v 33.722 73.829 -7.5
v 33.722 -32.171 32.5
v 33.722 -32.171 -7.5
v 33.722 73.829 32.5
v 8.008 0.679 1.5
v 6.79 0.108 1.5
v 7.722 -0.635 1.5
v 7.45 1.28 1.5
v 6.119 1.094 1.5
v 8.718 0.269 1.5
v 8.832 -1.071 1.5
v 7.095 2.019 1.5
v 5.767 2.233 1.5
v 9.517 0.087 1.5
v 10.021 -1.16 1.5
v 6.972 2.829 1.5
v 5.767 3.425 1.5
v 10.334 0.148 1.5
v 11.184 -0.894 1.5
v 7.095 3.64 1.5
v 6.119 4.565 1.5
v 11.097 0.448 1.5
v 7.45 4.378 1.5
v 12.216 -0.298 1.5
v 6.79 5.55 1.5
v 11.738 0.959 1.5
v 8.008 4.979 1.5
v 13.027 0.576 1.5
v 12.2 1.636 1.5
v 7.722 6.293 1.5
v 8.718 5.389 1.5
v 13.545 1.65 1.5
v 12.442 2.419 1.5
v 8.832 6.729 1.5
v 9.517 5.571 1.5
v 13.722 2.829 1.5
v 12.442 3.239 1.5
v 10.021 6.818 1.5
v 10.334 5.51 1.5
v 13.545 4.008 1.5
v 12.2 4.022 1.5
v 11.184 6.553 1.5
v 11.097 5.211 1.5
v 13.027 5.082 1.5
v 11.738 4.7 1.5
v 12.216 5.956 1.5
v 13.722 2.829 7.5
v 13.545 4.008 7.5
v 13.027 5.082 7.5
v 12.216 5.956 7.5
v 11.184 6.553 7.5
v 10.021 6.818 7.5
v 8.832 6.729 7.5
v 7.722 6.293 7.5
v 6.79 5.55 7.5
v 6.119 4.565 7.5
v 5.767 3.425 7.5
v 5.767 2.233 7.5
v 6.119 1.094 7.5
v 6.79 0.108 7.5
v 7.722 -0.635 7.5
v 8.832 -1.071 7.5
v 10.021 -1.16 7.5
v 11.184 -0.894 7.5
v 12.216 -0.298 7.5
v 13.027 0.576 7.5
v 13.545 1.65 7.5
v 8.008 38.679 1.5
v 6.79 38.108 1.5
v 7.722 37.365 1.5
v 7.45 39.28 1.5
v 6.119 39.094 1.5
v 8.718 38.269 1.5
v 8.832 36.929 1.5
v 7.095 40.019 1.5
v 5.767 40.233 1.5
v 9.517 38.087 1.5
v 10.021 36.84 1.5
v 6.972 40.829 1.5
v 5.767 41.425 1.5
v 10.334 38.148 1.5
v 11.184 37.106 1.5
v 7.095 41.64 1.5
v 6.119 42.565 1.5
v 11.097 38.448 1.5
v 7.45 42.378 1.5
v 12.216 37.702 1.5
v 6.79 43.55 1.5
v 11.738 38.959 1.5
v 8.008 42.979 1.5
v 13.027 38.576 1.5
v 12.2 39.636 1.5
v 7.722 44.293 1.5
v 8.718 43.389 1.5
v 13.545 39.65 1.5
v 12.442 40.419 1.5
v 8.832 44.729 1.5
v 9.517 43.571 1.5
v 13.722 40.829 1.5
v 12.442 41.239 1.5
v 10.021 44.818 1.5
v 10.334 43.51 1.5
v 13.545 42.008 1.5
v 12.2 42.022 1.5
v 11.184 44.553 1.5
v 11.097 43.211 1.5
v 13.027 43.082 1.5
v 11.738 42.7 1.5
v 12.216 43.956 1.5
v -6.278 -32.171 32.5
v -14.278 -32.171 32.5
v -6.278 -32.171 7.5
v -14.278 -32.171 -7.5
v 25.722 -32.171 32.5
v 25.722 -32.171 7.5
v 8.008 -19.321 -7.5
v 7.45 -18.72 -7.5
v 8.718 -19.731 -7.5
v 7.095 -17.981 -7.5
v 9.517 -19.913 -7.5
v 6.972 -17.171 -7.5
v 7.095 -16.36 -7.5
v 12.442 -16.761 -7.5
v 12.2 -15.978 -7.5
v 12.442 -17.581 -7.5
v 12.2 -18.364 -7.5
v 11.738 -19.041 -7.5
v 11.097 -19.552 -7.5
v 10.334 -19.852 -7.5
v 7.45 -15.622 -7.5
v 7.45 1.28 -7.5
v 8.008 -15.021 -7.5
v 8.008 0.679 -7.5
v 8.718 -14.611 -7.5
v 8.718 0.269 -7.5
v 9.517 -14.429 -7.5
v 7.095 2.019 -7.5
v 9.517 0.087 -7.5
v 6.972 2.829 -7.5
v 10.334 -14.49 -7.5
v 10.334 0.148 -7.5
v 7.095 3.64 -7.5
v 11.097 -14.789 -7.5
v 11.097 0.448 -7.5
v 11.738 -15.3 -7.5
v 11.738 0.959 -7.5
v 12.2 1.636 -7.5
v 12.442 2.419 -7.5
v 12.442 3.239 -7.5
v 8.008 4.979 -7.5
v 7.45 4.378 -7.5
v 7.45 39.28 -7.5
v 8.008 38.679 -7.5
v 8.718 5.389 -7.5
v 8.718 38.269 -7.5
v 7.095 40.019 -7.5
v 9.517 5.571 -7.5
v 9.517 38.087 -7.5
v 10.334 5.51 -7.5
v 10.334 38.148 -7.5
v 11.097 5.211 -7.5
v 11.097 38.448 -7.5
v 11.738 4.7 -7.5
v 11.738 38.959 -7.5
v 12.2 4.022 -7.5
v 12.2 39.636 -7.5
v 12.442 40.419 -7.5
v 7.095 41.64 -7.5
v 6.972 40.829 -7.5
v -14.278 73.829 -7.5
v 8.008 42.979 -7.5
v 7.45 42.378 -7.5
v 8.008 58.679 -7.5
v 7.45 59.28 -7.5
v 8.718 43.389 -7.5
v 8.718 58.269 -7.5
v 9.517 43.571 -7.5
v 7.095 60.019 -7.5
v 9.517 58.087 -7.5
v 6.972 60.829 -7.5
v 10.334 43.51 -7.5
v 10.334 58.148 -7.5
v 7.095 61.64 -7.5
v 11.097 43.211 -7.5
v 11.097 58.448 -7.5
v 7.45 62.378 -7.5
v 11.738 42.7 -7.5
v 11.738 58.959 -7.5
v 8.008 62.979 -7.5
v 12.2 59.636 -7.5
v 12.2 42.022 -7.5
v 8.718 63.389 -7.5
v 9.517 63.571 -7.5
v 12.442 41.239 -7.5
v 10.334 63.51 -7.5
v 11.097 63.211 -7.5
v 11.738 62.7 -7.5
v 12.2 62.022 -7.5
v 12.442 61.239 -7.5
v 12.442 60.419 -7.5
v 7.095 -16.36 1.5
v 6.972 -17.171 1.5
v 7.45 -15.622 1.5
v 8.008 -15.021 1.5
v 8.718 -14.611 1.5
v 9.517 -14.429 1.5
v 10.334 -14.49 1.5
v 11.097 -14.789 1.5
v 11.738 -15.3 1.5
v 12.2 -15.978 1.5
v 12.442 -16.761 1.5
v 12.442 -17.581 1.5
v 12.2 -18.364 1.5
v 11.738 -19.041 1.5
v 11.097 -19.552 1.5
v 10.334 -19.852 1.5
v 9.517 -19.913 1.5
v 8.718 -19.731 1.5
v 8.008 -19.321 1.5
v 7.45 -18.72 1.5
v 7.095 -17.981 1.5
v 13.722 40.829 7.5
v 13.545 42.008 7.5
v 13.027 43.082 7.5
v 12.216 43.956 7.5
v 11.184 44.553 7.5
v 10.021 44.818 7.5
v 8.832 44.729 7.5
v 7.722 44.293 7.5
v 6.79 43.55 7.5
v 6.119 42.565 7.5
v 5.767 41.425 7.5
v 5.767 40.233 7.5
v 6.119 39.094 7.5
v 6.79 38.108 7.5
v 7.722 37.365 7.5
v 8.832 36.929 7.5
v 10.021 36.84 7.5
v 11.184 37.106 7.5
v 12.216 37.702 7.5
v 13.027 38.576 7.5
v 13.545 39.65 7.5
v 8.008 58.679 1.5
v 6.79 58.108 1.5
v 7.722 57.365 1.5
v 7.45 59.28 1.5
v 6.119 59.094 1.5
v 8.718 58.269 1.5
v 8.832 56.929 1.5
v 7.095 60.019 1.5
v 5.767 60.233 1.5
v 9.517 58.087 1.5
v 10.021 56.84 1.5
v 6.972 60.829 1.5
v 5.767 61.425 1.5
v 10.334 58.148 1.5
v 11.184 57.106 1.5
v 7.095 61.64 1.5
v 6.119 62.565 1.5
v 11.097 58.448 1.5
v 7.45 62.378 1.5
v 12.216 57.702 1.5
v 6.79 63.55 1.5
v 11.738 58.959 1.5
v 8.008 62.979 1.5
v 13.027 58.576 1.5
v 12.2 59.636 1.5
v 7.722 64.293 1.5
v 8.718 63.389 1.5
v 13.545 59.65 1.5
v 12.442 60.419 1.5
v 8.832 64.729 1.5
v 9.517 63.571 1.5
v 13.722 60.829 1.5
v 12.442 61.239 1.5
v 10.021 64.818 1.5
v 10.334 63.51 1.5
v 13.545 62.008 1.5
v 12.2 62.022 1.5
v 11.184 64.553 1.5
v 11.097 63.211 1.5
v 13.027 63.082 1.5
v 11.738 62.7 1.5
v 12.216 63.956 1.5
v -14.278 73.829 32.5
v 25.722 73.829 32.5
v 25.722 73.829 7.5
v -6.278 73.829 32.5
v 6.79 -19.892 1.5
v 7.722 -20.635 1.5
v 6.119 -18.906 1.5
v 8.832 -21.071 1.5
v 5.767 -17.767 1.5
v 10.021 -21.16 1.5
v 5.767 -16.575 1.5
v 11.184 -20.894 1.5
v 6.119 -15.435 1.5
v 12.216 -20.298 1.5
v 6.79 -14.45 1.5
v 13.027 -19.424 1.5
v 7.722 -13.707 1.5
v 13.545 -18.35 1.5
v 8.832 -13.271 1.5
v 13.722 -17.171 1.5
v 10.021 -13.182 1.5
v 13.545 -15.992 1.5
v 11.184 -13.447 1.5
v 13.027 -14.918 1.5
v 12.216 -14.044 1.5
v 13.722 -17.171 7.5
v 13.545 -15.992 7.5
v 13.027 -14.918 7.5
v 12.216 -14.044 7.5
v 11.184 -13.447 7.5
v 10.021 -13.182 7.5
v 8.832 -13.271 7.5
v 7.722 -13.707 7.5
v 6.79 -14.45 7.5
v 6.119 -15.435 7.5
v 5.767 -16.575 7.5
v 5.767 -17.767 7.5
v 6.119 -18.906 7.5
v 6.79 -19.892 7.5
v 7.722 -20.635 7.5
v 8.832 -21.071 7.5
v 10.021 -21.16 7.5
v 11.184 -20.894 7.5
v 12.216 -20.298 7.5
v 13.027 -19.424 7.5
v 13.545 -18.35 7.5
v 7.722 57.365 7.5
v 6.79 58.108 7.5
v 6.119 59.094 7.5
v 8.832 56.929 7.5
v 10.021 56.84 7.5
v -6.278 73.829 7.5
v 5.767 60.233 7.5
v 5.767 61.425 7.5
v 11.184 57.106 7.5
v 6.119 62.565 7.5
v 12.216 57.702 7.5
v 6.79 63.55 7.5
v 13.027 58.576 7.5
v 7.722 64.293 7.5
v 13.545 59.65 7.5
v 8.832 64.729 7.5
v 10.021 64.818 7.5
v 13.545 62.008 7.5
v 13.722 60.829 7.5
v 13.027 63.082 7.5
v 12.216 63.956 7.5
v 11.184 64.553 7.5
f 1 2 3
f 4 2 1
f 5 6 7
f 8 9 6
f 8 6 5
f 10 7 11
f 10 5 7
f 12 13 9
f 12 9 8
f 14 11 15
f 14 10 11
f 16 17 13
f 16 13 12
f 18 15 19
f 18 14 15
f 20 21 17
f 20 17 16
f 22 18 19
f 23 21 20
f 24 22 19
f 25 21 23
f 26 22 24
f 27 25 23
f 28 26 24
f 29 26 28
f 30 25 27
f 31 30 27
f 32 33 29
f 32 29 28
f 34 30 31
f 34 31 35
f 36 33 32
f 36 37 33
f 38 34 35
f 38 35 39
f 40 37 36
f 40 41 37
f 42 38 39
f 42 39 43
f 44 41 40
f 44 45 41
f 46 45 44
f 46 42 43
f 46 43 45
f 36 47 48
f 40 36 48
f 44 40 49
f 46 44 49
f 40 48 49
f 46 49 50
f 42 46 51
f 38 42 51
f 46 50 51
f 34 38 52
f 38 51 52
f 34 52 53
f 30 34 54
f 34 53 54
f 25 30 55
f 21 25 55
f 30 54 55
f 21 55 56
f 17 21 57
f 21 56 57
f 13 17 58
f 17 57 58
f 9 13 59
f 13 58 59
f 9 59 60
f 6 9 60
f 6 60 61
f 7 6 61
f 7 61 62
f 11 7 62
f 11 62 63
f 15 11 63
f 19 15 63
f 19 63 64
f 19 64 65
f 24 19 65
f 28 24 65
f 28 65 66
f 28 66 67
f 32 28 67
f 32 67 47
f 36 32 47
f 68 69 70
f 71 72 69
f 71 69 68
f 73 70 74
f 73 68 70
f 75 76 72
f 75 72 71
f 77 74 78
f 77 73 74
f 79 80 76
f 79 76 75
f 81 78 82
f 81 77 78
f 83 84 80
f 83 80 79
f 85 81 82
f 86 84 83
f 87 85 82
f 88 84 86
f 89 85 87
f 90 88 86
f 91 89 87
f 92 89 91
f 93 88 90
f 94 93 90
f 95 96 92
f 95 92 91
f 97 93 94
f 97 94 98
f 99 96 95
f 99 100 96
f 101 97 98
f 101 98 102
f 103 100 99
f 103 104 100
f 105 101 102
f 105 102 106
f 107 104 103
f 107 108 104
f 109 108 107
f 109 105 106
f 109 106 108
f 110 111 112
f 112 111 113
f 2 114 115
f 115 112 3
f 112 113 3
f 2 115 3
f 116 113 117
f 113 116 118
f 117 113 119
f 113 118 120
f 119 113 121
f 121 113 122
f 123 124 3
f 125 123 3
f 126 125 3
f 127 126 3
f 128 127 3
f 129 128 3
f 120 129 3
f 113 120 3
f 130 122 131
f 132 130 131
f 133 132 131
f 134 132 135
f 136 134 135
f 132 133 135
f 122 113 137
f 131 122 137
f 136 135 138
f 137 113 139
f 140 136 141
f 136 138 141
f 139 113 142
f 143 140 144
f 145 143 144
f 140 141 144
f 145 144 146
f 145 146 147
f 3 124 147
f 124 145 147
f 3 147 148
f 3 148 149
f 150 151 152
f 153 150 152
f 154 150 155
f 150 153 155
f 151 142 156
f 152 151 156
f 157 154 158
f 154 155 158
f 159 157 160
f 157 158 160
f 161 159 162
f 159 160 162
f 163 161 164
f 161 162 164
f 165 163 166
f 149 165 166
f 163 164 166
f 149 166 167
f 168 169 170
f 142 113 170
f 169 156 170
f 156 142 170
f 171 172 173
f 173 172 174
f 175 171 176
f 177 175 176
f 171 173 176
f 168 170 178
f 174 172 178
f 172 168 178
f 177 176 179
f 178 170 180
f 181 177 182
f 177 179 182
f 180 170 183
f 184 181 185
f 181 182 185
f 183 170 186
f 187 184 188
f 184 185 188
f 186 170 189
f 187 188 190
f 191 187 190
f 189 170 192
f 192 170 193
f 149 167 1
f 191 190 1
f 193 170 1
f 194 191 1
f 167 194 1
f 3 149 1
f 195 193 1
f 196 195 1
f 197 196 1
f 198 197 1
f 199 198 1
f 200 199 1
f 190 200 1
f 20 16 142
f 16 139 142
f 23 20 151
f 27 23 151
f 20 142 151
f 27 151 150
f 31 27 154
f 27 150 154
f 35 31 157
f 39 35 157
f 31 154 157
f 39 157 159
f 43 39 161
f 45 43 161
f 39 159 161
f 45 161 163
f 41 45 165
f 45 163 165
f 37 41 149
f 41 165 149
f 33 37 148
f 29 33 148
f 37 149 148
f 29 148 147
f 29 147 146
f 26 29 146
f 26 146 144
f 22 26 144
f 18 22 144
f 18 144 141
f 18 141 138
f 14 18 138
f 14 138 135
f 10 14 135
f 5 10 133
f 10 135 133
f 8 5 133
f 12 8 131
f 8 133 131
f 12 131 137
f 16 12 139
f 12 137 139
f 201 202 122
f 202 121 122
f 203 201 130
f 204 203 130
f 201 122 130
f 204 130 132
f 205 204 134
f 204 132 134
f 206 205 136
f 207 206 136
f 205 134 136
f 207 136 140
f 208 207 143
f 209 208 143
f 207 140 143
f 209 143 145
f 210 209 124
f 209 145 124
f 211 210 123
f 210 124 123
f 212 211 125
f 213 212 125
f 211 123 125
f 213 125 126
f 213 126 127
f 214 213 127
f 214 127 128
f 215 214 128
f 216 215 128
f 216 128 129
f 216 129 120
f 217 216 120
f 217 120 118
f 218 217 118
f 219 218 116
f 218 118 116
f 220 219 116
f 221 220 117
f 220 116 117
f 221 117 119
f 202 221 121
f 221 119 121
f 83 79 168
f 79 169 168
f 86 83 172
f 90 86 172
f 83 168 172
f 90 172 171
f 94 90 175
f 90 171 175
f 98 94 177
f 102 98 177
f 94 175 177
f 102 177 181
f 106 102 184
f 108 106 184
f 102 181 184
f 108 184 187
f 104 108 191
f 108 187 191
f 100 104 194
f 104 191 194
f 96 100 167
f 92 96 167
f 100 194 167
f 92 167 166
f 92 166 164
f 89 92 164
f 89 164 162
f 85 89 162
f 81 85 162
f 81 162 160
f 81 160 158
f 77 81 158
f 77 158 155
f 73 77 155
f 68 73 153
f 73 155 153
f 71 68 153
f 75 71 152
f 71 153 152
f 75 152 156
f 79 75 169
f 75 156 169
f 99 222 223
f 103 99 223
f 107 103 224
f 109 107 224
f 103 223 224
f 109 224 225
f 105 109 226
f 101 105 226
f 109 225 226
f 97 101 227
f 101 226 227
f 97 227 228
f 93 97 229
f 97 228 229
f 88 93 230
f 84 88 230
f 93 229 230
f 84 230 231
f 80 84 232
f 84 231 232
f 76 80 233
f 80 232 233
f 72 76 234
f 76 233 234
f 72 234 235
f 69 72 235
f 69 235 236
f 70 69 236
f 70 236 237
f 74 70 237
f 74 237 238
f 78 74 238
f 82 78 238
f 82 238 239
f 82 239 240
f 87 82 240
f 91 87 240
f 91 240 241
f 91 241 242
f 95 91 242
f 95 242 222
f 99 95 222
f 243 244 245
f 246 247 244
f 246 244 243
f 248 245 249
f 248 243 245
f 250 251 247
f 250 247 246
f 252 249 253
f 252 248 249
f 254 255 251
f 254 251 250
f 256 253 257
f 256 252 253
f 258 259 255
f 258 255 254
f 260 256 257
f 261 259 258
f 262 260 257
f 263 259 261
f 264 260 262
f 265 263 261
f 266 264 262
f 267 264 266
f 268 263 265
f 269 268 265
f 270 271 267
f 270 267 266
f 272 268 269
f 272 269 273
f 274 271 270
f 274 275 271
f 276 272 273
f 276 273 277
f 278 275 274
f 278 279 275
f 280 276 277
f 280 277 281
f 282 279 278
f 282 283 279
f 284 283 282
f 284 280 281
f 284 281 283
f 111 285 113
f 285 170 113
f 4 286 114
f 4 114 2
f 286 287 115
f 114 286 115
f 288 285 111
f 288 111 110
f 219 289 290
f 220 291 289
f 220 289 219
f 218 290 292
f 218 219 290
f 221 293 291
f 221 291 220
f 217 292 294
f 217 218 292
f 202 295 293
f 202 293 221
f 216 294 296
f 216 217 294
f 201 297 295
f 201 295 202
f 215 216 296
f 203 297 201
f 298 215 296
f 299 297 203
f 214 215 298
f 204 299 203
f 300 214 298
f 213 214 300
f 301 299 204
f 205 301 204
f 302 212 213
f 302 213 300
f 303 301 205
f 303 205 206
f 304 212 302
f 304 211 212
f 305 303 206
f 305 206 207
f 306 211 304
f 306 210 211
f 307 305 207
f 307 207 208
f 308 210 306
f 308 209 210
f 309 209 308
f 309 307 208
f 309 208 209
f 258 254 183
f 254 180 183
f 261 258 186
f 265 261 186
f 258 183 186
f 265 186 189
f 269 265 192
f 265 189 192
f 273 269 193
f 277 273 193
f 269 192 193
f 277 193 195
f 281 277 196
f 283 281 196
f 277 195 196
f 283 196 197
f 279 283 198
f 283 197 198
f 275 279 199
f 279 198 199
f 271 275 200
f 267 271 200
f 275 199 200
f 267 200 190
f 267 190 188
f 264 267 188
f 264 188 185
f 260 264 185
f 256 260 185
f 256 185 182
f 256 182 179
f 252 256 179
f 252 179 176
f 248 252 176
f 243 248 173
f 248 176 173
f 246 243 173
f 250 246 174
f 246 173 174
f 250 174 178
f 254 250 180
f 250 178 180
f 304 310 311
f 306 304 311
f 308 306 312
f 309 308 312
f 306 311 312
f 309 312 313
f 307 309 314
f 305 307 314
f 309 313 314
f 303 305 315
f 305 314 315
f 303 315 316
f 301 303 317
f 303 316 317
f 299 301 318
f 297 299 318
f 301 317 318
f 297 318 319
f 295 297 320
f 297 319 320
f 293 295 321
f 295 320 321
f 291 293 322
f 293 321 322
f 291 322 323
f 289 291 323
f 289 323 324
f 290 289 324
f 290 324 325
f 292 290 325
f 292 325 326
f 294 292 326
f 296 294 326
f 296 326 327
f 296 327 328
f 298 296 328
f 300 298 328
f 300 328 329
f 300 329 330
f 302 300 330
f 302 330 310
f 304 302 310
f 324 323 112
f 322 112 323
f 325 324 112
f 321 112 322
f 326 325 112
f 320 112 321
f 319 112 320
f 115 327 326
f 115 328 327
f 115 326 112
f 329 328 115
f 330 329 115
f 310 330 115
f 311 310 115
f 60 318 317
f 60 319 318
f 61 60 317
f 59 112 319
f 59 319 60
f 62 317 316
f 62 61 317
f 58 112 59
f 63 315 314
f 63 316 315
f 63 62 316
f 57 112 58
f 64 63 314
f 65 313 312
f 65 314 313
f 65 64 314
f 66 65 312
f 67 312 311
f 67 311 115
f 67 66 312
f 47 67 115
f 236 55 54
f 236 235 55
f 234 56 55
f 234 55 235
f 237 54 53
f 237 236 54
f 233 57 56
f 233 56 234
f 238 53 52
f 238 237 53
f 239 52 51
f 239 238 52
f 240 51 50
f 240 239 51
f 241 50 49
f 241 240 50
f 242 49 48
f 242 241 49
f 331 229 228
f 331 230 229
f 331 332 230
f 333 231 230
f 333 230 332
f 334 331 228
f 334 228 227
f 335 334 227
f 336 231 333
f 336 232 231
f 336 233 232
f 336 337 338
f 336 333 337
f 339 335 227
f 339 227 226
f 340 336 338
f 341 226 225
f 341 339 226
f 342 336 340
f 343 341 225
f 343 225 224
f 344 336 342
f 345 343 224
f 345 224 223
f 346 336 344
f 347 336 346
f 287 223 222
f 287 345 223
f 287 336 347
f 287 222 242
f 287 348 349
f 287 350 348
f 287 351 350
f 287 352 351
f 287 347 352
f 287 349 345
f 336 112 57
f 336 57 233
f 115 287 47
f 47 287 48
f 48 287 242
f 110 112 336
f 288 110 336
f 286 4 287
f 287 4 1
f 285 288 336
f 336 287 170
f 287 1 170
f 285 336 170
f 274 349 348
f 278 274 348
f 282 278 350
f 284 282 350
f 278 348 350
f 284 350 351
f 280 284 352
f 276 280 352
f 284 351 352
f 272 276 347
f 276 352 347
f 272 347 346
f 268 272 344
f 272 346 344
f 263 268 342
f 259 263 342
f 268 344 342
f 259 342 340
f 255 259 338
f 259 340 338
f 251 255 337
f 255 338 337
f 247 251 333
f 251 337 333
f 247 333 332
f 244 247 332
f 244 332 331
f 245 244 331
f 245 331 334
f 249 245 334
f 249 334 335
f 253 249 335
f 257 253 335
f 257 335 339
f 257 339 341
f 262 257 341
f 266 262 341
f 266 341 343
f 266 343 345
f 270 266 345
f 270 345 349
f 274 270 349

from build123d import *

# Parameters (mm, degrees)
F0_W           = 48
F0_H           = 106
F1_DEPTH       = 7.5
F4_DEPTH       = 25
F6_D           = 5.5
F6_CBORE_D     = 8
F6_CBORE_DEPTH = 6


with BuildPart() as f1:
    # F0 (on Top) → F1 (new body, symmetric)
    with BuildSketch(Plane.XY):
        with Locations((9.722433, 20.829119)):
            Rectangle(F0_W, F0_H)
    extrude(amount=F1_DEPTH, both=True)

    # F3 (on face) → F4 (join)
    with BuildSketch(Plane.XY.offset(7.5)):
        Polygon((-6.277567, 20.829119), (-6.277567, 73.829119), (-14.277567, 73.829119), (-14.277567, -32.170881), (-6.277567, -32.170881), align=None)
        Polygon((33.722433, 73.829119), (25.722433, 73.829119), (25.722433, 20.829119), (25.722433, -32.170881), (33.722433, -32.170881), align=None)
    extrude(amount=F4_DEPTH)

    # F6 (through all)
    with Locations(Plane.XY.offset(7.5)):
        with Locations((9.722433, 40.829119), (9.722433, 60.829119), (9.722433, 2.829119), (9.722433, -17.170881)):
            CounterBoreHole(F6_D / 2, F6_CBORE_D / 2, F6_CBORE_DEPTH)


solid = f1.part
